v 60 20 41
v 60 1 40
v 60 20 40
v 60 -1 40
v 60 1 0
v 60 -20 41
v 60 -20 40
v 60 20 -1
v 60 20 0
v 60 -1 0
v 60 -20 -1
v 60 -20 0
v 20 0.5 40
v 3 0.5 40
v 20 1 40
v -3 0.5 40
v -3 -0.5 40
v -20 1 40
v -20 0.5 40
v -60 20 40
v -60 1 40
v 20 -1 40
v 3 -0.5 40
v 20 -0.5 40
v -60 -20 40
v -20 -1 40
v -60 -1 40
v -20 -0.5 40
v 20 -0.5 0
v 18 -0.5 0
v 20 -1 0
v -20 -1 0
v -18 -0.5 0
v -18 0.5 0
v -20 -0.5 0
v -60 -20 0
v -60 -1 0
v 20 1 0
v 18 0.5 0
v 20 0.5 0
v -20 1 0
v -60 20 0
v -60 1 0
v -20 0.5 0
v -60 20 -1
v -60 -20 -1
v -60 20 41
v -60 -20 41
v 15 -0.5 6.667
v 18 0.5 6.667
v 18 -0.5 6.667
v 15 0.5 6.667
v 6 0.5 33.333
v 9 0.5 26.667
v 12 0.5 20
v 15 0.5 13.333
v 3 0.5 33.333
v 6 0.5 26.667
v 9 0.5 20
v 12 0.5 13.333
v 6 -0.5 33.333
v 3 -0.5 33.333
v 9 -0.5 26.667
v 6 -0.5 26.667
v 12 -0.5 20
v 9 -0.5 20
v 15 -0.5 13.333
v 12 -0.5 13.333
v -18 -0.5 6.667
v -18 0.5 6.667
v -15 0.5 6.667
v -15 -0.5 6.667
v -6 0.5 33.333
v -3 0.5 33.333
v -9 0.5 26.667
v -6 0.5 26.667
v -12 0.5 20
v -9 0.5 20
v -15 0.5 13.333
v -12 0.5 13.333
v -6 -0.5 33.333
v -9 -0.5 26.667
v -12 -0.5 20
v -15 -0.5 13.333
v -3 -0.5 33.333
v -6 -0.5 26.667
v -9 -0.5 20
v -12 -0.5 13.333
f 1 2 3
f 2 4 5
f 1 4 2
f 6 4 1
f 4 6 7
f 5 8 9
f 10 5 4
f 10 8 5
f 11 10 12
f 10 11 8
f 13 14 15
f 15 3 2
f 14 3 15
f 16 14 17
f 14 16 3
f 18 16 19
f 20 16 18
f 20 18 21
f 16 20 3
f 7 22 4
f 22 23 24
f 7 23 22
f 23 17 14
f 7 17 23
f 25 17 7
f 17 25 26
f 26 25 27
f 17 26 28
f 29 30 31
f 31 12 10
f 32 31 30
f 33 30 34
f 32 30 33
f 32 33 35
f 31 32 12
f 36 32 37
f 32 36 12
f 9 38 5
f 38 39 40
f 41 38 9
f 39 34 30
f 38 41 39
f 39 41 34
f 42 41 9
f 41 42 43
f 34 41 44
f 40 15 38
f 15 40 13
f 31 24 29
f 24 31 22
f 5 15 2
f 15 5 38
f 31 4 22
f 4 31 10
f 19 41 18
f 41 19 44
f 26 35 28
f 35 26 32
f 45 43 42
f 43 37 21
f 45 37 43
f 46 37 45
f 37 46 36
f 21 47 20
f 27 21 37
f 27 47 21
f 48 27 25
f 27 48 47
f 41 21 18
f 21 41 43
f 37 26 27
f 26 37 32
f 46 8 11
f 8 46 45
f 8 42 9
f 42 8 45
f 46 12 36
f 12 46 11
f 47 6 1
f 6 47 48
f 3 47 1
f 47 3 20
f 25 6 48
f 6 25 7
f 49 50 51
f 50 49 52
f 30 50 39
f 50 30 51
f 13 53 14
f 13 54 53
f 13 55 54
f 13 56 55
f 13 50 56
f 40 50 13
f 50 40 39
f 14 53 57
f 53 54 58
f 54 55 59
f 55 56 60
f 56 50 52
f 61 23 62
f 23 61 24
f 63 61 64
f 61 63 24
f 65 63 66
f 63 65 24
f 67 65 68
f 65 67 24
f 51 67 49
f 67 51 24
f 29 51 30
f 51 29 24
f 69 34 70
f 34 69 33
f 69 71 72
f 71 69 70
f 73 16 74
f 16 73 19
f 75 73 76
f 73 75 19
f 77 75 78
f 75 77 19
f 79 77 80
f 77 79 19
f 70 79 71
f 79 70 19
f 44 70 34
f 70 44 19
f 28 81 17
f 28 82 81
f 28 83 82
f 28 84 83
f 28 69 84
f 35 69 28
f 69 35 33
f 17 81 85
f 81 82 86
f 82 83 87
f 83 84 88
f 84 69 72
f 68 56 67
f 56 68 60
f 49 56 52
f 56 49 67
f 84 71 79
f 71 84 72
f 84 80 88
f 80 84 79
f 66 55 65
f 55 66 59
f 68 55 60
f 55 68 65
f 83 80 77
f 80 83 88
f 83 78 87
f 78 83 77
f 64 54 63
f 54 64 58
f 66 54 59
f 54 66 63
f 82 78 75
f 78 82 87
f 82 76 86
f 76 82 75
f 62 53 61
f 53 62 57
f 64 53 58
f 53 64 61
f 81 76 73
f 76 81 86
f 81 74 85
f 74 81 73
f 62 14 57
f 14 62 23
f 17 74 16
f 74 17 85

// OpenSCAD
op = 20;
w = 40;
h = 40;
l0 = 2;
fw = op+w;
fh = 1;
fl = 20;
xop = 3;
l1 = l0/2;
xw = 20;
lay = 6;
xh = h/lay;

color([0.8,0.8,0.8]){
    translate([op,-l0/2,0])cube([w,l0,h]);
    translate([-op-w,-l0/2,0])cube([w,l0,h]);
    translate([-fw,-fl,-fh])cube([fw*2,fl*2,fh]);
    translate([-fw,-fl,h])cube([fw*2,fl*2,fh]);
}

color([1,1,1]){
    
    for(i = [0:lay-1]){
        dop = xop*(lay-i);
        translate([dop,-l1/2,xh*i])cube([xw,l1,xh]);
        translate([-dop-xw,-l1/2,xh*i])cube([xw,l1,xh]);
    }

}
